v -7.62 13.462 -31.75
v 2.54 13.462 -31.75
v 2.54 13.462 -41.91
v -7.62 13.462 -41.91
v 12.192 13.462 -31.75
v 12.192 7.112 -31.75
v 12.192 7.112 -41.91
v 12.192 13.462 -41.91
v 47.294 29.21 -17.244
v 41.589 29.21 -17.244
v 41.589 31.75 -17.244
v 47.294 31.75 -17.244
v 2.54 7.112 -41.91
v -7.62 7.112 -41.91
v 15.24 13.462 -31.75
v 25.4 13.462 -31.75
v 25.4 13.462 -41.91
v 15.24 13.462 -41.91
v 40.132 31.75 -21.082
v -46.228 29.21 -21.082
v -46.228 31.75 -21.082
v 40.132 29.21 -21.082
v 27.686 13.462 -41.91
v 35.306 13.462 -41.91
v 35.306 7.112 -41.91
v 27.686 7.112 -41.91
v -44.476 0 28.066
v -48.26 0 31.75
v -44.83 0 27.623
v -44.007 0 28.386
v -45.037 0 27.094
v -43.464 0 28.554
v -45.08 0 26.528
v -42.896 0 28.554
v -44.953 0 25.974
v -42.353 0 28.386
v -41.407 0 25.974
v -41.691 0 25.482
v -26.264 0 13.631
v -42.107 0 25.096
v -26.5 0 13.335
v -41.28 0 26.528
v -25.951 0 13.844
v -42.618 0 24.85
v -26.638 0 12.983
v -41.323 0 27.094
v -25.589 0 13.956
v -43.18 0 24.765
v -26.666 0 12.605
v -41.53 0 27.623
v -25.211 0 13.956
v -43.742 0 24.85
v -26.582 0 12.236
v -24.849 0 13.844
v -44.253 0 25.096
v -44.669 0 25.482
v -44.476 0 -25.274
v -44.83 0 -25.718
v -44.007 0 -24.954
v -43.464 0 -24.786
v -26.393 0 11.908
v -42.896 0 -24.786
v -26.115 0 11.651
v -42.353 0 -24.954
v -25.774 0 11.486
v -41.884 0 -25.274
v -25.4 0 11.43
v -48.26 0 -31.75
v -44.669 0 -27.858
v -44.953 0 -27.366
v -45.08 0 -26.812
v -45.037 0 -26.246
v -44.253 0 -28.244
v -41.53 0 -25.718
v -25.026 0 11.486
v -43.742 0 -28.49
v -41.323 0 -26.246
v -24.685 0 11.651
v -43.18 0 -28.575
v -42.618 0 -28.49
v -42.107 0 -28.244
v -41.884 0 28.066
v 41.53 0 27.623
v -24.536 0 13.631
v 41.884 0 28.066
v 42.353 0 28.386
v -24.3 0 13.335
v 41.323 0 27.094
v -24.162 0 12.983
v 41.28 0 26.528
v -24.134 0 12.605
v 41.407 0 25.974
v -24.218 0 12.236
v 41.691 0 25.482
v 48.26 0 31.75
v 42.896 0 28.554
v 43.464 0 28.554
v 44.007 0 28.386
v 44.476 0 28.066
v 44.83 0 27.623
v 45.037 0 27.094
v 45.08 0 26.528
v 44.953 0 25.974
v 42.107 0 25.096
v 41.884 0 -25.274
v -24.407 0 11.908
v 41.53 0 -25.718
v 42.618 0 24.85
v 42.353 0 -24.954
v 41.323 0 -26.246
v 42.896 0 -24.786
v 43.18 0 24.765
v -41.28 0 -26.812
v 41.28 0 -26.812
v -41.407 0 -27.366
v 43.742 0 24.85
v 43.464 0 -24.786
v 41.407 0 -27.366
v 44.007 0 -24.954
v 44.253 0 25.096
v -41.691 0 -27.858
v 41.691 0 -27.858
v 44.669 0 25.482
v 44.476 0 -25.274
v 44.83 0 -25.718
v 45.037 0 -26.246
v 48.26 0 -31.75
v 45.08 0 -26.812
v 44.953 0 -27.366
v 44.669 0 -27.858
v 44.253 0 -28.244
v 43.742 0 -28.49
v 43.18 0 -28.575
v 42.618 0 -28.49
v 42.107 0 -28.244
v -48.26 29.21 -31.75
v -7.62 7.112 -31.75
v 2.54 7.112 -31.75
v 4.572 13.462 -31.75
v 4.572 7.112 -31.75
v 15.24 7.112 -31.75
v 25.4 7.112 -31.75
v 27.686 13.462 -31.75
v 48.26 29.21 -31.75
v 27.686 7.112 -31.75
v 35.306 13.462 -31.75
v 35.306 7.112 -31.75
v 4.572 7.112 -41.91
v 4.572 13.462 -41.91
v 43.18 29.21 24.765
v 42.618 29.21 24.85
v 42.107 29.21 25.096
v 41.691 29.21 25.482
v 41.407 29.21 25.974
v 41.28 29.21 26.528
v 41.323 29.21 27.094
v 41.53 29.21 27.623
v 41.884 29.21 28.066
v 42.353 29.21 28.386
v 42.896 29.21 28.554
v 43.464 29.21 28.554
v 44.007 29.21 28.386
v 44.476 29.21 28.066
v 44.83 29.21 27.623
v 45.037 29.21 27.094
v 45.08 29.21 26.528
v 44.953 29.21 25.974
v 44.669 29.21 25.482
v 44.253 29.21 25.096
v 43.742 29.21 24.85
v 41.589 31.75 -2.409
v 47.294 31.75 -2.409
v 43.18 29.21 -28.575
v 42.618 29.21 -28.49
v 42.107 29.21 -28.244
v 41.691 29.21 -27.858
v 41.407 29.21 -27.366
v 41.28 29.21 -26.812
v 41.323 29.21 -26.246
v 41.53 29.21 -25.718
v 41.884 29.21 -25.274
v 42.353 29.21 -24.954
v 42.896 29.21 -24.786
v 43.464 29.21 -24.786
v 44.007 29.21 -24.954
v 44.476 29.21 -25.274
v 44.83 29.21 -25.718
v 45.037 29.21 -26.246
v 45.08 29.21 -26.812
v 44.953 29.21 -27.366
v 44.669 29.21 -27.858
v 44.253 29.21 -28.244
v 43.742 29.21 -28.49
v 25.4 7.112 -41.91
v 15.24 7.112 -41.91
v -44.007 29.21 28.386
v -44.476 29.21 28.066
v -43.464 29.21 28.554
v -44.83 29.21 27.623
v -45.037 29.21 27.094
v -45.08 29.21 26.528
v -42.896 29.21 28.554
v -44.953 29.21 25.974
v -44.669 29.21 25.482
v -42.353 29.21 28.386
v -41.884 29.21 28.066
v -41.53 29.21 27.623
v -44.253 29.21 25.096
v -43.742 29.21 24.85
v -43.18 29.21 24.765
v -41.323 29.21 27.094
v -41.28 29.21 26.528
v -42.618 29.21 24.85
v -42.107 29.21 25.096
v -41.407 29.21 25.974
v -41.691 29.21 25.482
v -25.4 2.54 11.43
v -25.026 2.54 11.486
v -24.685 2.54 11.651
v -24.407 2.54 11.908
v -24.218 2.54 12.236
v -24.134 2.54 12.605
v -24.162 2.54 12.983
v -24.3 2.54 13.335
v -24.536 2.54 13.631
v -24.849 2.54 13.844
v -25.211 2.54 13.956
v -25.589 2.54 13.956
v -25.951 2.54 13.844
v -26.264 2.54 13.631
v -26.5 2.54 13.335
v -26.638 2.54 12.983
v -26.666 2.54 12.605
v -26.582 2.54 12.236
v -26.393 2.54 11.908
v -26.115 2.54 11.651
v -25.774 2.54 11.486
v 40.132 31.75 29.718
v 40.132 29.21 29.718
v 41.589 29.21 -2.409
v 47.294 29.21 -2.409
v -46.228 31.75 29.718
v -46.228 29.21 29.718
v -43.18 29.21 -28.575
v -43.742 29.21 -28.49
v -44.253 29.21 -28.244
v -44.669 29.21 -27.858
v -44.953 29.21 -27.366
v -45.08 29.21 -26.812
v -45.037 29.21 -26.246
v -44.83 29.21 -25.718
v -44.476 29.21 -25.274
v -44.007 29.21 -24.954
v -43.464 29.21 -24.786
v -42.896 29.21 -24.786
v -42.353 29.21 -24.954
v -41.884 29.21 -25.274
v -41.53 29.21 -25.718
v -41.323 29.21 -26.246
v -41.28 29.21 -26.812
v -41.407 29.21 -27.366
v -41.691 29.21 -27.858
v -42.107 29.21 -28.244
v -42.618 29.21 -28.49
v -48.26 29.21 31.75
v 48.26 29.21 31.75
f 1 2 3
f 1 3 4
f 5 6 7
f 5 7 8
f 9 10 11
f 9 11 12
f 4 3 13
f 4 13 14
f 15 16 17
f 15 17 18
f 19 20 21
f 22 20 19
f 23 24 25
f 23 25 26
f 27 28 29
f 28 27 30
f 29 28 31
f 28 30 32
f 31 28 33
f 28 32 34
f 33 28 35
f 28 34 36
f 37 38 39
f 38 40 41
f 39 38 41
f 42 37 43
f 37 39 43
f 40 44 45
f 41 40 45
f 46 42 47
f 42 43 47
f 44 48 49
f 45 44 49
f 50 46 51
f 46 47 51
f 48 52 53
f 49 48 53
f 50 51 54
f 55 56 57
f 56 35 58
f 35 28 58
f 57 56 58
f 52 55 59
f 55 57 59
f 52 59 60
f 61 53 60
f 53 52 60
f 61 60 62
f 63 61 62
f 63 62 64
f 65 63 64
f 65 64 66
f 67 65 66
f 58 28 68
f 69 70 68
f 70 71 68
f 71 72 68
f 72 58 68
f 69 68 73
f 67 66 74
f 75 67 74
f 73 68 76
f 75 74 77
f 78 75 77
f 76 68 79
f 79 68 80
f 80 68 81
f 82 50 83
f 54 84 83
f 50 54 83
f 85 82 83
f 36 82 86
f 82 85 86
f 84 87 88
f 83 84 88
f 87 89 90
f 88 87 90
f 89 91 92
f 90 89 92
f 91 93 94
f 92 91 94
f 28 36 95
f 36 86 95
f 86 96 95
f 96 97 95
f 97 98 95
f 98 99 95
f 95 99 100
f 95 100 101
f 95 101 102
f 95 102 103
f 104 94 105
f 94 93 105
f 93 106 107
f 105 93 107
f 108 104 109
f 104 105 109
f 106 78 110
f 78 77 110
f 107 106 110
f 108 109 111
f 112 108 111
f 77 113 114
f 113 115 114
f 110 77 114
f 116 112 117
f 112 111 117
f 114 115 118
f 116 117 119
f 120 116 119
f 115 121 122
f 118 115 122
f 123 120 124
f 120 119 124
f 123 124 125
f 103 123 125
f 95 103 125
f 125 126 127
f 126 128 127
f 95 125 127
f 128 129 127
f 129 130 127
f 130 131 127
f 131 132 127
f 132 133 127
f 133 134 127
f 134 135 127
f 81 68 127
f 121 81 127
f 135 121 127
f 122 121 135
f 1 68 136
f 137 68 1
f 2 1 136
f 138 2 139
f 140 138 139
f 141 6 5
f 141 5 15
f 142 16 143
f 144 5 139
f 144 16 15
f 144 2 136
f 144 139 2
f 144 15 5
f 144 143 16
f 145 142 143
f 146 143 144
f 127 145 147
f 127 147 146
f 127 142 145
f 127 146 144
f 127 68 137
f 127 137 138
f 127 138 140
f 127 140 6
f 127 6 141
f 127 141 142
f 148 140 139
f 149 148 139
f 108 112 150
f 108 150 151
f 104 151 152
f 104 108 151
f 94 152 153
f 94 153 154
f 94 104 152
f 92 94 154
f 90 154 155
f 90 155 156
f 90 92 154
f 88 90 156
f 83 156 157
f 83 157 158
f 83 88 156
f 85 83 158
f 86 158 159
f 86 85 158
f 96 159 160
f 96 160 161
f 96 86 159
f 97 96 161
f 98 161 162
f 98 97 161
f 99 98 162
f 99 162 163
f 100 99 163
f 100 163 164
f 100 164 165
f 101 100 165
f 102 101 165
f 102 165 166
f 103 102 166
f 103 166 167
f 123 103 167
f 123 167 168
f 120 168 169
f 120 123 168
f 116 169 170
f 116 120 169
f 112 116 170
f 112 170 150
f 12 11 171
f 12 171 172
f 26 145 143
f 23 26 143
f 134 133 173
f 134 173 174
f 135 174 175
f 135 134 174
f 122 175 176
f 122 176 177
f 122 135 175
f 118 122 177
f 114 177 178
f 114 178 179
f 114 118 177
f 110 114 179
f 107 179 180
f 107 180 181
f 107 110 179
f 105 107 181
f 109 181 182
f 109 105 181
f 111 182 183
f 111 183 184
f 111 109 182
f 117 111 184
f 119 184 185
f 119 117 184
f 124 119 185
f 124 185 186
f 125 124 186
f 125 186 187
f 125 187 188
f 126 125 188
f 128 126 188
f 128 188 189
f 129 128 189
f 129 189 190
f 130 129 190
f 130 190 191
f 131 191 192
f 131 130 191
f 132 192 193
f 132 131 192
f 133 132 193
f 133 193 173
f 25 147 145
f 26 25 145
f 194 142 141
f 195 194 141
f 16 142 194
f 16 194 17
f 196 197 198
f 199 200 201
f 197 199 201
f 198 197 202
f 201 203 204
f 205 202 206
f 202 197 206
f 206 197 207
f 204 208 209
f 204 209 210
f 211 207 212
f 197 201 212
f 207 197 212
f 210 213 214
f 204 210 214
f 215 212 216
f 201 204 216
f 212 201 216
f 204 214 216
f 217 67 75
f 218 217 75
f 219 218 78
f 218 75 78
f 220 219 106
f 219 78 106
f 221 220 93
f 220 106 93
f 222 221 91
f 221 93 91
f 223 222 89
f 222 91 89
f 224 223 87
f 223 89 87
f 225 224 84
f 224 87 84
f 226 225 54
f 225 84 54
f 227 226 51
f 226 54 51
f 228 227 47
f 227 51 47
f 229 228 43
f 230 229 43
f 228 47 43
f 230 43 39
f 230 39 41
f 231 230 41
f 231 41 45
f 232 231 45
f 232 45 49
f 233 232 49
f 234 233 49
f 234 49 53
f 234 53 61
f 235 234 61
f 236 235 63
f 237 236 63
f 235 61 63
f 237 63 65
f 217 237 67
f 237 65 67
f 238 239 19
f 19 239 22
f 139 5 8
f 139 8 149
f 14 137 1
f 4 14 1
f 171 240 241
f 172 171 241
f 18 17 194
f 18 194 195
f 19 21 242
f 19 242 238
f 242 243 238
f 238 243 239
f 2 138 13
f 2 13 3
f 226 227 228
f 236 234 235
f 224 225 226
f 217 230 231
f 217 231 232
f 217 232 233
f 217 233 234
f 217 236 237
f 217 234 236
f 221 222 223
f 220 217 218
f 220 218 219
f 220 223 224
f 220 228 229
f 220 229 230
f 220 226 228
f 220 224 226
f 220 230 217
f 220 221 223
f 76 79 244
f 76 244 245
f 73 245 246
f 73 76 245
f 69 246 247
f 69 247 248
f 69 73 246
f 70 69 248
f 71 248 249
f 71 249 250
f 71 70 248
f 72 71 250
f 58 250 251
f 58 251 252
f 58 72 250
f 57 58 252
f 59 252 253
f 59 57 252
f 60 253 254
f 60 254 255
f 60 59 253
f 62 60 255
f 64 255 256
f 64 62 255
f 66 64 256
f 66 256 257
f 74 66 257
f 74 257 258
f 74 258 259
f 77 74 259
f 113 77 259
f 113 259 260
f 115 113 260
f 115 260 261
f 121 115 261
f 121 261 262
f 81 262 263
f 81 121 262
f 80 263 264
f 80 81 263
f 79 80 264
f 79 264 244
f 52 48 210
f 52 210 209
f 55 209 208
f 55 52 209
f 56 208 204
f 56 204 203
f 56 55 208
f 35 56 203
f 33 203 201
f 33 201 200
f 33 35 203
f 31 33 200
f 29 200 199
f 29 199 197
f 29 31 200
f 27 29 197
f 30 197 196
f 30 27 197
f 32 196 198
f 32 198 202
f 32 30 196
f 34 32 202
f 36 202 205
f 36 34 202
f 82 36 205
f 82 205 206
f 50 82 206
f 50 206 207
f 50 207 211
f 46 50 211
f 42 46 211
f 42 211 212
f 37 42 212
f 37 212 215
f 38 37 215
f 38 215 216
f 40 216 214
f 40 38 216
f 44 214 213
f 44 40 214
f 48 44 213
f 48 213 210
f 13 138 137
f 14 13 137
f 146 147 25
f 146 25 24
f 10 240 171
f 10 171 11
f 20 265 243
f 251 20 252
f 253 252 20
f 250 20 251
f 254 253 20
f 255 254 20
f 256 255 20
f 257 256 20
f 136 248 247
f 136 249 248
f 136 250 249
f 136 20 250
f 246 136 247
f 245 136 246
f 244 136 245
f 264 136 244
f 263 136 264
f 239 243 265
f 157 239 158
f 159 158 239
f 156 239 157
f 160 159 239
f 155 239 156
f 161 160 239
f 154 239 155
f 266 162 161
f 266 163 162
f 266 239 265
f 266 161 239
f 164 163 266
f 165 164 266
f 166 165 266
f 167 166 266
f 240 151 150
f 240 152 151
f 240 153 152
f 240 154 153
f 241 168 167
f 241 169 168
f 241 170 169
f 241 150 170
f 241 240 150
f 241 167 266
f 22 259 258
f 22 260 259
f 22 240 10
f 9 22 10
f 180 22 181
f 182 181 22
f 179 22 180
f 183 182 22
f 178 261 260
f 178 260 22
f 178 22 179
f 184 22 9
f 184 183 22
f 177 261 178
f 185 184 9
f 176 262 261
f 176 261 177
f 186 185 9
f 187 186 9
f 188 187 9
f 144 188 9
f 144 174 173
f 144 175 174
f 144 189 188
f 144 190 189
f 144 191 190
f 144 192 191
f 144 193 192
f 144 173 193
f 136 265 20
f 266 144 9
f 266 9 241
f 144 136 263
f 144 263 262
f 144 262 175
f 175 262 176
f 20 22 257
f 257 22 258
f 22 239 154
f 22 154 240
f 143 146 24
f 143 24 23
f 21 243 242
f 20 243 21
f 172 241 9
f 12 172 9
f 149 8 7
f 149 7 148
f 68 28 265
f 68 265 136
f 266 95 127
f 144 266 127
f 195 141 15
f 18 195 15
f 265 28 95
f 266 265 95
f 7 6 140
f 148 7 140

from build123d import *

# Parameters (mm, degrees)
SKETCH1_W           = 96.52
SKETCH1_H           = 63.5
SKETCH1_R           = 1.905
BOSS_EXTRUDE1_DEPTH = 29.21
SKETCH2_W           = 86.36
SKETCH2_H           = 50.8
SKETCH2_W_2         = 5.705747077
SKETCH2_H_2         = 14.834942399
BOSS_EXTRUDE2_DEPTH = 2.54
SKETCH3_R           = 1.27
CUT_EXTRUDE1_DEPTH  = 2.54
SKETCH4_W           = 7.62
SKETCH4_H           = 6.35
SKETCH4_W_2         = 10.16
BOSS_EXTRUDE3_DEPTH = 10.16


with BuildPart() as part:
    # Sketch1 → Boss-Extrude1 (new body)
    with BuildSketch(Plane(origin=(0, 0, 0), x_dir=(1, 0, 0), z_dir=(0, 1, 0))):
        Rectangle(SKETCH1_W, SKETCH1_H)
        with Locations(Location((-43.18, 26.67, 0), (0, 0, 90))):
            Circle(SKETCH1_R, mode=Mode.SUBTRACT)
        with Locations(Location((43.18, 26.67, 0), (0, 0, 90))):
            Circle(SKETCH1_R, mode=Mode.SUBTRACT)
        with Locations(Location((43.18, -26.67, 0), (0, 0, 90))):
            Circle(SKETCH1_R, mode=Mode.SUBTRACT)
        with Locations(Location((-43.18, -26.67, 0), (0, 0, 90))):
            Circle(SKETCH1_R, mode=Mode.SUBTRACT)
    extrude(amount=BOSS_EXTRUDE1_DEPTH)

    # Sketch2 → Boss-Extrude2 (add)
    with BuildSketch(Plane(origin=(0, 29.21, 0), x_dir=(1, 0, 0), z_dir=(0, 1, 0))):
        with Locations((-3.048, -4.318)):
            Rectangle(SKETCH2_W, SKETCH2_H)
        with Locations((44.441430006, 9.82656441)):
            Rectangle(SKETCH2_W_2, SKETCH2_H_2)
    extrude(amount=BOSS_EXTRUDE2_DEPTH)

    # Sketch3 → Cut-Extrude1 (cut)
    with BuildSketch(Plane.XZ):
        with Locations(Location((-25.4, 12.7, 0), (0, 0, 270))):
            Circle(SKETCH3_R)
    extrude(amount=-CUT_EXTRUDE1_DEPTH, mode=Mode.SUBTRACT)

    # Sketch4 → Boss-Extrude3 (add)
    with BuildSketch(Plane(origin=(0, 0, -31.75), x_dir=(-1, 0, 0), z_dir=(0, 0, -1))):
        with Locations((-31.496, 10.287)):
            Rectangle(SKETCH4_W, SKETCH4_H)
        with Locations((-20.32, 10.287)):
            Rectangle(SKETCH4_W_2, SKETCH4_H)
        with Locations((-8.382, 10.287)):
            Rectangle(SKETCH4_W, SKETCH4_H)
        with Locations((2.54, 10.287)):
            Rectangle(SKETCH4_W_2, SKETCH4_H)
    extrude(amount=BOSS_EXTRUDE3_DEPTH)


solid = part.part
